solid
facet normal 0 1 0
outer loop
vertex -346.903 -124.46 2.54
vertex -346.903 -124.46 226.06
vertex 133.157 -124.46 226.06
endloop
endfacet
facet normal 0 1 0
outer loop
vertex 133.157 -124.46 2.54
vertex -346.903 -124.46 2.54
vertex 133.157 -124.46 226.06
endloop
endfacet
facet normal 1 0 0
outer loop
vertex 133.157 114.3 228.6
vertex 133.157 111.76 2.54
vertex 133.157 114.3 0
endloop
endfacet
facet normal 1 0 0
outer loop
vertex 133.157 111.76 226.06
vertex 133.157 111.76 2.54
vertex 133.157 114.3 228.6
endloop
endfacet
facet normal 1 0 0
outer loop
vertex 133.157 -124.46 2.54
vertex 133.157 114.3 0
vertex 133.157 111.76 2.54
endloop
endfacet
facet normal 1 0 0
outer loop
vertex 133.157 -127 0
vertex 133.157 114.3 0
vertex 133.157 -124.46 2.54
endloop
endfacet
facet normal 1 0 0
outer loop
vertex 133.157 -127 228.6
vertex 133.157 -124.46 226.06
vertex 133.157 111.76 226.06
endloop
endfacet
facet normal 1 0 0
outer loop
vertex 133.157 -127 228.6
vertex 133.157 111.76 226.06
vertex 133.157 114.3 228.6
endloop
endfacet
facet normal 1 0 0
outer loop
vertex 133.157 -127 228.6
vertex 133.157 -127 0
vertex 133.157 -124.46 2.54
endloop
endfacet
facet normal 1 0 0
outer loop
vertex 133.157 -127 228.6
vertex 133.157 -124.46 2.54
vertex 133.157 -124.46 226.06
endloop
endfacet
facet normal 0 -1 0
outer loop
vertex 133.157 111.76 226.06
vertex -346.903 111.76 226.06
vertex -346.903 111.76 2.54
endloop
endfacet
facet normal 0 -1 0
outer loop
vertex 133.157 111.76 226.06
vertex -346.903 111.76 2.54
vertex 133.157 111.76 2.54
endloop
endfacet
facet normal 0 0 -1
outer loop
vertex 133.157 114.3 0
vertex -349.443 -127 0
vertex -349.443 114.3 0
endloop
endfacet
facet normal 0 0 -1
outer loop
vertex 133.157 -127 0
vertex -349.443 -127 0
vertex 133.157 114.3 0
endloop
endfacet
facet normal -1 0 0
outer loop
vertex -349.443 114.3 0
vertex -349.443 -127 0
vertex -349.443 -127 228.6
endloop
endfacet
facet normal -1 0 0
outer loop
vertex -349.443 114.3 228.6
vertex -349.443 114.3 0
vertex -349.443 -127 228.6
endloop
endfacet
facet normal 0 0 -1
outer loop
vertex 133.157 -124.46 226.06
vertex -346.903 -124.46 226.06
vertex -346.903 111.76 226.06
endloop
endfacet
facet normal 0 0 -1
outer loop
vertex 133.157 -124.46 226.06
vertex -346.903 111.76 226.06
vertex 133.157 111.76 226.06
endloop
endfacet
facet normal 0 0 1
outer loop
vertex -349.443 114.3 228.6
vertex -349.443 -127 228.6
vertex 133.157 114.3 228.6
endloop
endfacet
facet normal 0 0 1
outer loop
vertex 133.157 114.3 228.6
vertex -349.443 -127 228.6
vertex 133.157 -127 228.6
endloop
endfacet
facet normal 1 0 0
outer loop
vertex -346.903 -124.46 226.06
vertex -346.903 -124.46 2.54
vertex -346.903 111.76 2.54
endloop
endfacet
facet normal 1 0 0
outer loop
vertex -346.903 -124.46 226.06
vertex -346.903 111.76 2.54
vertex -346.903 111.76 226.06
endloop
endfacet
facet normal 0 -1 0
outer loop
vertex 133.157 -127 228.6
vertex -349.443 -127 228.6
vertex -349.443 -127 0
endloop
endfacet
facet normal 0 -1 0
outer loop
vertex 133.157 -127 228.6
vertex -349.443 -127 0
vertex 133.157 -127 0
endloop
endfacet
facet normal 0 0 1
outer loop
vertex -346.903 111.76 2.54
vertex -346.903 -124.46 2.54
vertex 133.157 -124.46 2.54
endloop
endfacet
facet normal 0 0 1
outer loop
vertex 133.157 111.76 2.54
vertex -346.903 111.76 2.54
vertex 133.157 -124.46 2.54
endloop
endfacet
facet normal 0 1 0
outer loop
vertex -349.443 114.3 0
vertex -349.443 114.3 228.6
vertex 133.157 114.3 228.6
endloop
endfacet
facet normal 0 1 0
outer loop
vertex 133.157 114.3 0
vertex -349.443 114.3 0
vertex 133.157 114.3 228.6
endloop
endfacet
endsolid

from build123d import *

# Parameters (mm, degrees)
F0_W      = 482.6
F0_H      = 228.6
F1_DEPTH  = 12.7
F1_FACE_W = 482.6
F1_FACE_H = 228.6
F2_DEPTH  = 114.3
F3_T      = -2.54


with BuildPart() as f1:
    # F0 (on Front) → F1 (new body, symmetric)
    with BuildSketch(Plane.XZ):
        with Locations((-108.143448, 114.3)):
            Rectangle(F0_W, F0_H)
    extrude(amount=F1_DEPTH, both=True)

    # F1_face (on face) + F0 (on Front) → F2 (join, symmetric)
    with BuildSketch(Plane(origin=(-108.143448, -12.7, 114.3), x_dir=(1, 0, 0), z_dir=(0, -1, 0))):
        Rectangle(F1_FACE_W, F1_FACE_H)
    with BuildSketch(Plane.XZ):
        with Locations((-108.143448, 114.3)):
            Rectangle(F0_W, F0_H)
    extrude(amount=F2_DEPTH, both=True)

    # F3
    f3_openings = [f1.faces().sort_by_distance(p)[0] for p in [
        (133.156552, -6.35, 114.3),
    ]]
    offset(amount=F3_T, openings=f3_openings)


solid = f1.part
